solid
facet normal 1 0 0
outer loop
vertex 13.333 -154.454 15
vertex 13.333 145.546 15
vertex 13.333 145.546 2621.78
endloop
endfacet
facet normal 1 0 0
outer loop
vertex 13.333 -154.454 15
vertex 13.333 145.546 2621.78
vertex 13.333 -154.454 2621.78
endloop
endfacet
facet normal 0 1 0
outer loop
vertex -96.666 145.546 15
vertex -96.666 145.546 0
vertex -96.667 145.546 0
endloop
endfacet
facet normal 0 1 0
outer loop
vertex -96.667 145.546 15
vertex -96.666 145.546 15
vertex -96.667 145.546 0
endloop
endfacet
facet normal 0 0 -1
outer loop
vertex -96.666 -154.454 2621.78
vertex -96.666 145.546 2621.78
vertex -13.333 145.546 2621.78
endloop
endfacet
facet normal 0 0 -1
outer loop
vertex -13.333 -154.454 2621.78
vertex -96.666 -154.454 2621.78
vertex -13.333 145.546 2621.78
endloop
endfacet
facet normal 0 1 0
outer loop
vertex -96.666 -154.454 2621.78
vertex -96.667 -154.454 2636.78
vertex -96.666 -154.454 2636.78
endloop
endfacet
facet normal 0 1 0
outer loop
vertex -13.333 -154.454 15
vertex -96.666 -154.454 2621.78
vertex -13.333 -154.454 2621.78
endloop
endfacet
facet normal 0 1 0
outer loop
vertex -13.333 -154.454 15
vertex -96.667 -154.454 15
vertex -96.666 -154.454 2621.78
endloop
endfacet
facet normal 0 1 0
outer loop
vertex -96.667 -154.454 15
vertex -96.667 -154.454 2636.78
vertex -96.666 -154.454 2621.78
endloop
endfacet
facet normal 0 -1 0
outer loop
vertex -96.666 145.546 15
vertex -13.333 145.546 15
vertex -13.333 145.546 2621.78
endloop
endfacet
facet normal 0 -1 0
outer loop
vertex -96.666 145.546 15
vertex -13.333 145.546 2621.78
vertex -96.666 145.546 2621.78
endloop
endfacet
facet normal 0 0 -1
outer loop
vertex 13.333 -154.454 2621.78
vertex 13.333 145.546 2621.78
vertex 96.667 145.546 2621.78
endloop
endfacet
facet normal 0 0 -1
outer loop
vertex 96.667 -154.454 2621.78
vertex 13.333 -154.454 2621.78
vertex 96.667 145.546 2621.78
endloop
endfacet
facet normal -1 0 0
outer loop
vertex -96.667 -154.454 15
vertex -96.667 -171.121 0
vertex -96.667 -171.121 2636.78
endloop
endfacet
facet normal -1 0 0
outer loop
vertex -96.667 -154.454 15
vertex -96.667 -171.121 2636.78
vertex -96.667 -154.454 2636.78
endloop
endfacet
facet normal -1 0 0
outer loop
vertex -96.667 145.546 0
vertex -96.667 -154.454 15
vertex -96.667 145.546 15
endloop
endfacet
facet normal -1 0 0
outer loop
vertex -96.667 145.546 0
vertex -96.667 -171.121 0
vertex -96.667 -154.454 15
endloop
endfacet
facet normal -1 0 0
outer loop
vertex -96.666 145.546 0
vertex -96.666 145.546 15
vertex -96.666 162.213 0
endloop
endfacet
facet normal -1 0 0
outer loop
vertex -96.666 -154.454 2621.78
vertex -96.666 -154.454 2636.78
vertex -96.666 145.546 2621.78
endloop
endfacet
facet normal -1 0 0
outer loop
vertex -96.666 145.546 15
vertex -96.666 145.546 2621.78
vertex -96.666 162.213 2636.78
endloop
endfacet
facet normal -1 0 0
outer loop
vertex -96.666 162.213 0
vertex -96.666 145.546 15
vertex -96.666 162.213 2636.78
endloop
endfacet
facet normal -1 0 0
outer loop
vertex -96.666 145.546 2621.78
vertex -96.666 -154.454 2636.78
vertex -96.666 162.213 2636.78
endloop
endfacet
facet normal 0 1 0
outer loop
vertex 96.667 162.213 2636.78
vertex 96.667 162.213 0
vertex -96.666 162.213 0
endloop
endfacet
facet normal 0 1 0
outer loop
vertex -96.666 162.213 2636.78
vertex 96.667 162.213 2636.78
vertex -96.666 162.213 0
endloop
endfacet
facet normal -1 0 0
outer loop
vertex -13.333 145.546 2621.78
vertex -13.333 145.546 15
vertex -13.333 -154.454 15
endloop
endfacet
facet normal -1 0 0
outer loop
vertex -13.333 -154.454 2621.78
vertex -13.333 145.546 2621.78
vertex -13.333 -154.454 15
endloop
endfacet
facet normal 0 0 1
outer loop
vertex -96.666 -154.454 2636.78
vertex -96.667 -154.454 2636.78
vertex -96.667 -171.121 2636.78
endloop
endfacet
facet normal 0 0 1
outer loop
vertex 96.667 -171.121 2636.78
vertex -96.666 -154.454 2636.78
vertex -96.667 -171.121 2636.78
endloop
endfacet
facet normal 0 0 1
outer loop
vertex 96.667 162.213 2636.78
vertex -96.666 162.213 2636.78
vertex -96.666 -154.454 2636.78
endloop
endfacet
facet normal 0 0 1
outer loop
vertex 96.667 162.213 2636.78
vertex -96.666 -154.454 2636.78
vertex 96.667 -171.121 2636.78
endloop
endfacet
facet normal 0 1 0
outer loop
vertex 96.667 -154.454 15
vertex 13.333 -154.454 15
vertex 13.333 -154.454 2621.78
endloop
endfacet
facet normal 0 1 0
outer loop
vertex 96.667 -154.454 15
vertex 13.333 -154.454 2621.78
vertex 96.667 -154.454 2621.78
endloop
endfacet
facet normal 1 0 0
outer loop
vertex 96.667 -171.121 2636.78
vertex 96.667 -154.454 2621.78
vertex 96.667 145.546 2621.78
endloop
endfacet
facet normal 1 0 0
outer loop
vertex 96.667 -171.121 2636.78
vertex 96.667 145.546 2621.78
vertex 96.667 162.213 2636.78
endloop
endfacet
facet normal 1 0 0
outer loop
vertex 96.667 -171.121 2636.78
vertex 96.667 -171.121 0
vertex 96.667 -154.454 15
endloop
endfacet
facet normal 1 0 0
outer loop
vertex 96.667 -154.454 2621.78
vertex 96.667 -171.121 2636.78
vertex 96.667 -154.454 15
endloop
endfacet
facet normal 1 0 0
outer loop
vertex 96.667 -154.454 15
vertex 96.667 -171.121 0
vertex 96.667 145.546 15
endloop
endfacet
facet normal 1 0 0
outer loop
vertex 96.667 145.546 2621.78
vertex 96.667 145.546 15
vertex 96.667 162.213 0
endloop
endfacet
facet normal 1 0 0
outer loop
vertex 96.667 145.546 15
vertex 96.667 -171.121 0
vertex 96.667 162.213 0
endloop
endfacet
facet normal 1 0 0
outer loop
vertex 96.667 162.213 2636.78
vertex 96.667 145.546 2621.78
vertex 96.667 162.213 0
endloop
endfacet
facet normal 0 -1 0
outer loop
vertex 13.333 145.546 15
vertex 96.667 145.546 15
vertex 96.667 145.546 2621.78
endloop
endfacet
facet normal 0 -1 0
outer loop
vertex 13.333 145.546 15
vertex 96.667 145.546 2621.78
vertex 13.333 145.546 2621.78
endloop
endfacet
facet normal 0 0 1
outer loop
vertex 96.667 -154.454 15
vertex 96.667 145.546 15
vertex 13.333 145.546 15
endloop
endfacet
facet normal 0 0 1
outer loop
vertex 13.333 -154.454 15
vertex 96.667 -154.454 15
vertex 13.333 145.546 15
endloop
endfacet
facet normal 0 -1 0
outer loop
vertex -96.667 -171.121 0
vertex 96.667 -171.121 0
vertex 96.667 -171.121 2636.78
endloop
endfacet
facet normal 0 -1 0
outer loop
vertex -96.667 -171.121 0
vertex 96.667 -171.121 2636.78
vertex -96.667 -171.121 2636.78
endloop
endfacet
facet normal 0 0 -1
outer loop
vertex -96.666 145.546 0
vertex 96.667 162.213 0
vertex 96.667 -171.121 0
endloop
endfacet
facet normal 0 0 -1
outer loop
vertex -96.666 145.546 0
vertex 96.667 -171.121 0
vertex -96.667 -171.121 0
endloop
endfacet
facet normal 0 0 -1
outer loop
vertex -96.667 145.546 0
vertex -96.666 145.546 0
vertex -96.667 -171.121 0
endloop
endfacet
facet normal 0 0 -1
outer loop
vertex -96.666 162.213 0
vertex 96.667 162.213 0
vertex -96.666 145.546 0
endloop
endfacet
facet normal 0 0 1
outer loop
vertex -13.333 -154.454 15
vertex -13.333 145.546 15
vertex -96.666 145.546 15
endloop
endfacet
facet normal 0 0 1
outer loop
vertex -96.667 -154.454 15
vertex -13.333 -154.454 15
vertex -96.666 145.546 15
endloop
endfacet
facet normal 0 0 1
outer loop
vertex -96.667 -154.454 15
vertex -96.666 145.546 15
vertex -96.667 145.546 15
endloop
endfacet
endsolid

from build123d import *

# Parameters (mm, degrees)
BOSS_EXTRUDE1_DEPTH = 2636.78
SKETCH2_W           = 193.333333334
SKETCH2_H           = 300
BOSS_EXTRUDE2_DEPTH = 15
SKETCH3_W           = 193.333
SKETCH3_H           = 300
BOSS_EXTRUDE4_DEPTH = 15


with BuildPart() as part:
    # Sketch1 → Boss-Extrude1 (new body)
    with BuildSketch(Plane.XY):
        Polygon((-13.333333333, -4.45387532), (-13.333333333, 145.54612468), (-96.666333333, 145.54612468), (-96.666333333, 162.212791347), (-13.333333333, 162.212791347), (0, 162.212791347), (96.666666667, 162.212791347), (96.666666667, 145.54612468), (13.333333333, 145.54612468), (13.333333333, -154.45387532), (96.666666667, -154.45387532), (96.666666667, -171.120541986), (-96.666666667, -171.120541986), (-96.666666667, -154.45387532), (-13.333333333, -154.45387532), align=None)
    extrude(amount=BOSS_EXTRUDE1_DEPTH)

    # Sketch2 → Boss-Extrude2 (add)
    with BuildSketch(Plane(origin=(0, 0, 0), x_dir=(-1, 0, 0), z_dir=(0, 0, -1))):
        with Locations((0, -4.45387532)):
            Rectangle(SKETCH2_W, SKETCH2_H)
    extrude(amount=-BOSS_EXTRUDE2_DEPTH)

    # Sketch3 → Boss-Extrude4 (add)
    with BuildSketch(Plane.XY.offset(2636.78)):
        with Locations((0.000166667, -4.45387532)):
            Rectangle(SKETCH3_W, SKETCH3_H)
    extrude(amount=-BOSS_EXTRUDE4_DEPTH)


solid = part.part
